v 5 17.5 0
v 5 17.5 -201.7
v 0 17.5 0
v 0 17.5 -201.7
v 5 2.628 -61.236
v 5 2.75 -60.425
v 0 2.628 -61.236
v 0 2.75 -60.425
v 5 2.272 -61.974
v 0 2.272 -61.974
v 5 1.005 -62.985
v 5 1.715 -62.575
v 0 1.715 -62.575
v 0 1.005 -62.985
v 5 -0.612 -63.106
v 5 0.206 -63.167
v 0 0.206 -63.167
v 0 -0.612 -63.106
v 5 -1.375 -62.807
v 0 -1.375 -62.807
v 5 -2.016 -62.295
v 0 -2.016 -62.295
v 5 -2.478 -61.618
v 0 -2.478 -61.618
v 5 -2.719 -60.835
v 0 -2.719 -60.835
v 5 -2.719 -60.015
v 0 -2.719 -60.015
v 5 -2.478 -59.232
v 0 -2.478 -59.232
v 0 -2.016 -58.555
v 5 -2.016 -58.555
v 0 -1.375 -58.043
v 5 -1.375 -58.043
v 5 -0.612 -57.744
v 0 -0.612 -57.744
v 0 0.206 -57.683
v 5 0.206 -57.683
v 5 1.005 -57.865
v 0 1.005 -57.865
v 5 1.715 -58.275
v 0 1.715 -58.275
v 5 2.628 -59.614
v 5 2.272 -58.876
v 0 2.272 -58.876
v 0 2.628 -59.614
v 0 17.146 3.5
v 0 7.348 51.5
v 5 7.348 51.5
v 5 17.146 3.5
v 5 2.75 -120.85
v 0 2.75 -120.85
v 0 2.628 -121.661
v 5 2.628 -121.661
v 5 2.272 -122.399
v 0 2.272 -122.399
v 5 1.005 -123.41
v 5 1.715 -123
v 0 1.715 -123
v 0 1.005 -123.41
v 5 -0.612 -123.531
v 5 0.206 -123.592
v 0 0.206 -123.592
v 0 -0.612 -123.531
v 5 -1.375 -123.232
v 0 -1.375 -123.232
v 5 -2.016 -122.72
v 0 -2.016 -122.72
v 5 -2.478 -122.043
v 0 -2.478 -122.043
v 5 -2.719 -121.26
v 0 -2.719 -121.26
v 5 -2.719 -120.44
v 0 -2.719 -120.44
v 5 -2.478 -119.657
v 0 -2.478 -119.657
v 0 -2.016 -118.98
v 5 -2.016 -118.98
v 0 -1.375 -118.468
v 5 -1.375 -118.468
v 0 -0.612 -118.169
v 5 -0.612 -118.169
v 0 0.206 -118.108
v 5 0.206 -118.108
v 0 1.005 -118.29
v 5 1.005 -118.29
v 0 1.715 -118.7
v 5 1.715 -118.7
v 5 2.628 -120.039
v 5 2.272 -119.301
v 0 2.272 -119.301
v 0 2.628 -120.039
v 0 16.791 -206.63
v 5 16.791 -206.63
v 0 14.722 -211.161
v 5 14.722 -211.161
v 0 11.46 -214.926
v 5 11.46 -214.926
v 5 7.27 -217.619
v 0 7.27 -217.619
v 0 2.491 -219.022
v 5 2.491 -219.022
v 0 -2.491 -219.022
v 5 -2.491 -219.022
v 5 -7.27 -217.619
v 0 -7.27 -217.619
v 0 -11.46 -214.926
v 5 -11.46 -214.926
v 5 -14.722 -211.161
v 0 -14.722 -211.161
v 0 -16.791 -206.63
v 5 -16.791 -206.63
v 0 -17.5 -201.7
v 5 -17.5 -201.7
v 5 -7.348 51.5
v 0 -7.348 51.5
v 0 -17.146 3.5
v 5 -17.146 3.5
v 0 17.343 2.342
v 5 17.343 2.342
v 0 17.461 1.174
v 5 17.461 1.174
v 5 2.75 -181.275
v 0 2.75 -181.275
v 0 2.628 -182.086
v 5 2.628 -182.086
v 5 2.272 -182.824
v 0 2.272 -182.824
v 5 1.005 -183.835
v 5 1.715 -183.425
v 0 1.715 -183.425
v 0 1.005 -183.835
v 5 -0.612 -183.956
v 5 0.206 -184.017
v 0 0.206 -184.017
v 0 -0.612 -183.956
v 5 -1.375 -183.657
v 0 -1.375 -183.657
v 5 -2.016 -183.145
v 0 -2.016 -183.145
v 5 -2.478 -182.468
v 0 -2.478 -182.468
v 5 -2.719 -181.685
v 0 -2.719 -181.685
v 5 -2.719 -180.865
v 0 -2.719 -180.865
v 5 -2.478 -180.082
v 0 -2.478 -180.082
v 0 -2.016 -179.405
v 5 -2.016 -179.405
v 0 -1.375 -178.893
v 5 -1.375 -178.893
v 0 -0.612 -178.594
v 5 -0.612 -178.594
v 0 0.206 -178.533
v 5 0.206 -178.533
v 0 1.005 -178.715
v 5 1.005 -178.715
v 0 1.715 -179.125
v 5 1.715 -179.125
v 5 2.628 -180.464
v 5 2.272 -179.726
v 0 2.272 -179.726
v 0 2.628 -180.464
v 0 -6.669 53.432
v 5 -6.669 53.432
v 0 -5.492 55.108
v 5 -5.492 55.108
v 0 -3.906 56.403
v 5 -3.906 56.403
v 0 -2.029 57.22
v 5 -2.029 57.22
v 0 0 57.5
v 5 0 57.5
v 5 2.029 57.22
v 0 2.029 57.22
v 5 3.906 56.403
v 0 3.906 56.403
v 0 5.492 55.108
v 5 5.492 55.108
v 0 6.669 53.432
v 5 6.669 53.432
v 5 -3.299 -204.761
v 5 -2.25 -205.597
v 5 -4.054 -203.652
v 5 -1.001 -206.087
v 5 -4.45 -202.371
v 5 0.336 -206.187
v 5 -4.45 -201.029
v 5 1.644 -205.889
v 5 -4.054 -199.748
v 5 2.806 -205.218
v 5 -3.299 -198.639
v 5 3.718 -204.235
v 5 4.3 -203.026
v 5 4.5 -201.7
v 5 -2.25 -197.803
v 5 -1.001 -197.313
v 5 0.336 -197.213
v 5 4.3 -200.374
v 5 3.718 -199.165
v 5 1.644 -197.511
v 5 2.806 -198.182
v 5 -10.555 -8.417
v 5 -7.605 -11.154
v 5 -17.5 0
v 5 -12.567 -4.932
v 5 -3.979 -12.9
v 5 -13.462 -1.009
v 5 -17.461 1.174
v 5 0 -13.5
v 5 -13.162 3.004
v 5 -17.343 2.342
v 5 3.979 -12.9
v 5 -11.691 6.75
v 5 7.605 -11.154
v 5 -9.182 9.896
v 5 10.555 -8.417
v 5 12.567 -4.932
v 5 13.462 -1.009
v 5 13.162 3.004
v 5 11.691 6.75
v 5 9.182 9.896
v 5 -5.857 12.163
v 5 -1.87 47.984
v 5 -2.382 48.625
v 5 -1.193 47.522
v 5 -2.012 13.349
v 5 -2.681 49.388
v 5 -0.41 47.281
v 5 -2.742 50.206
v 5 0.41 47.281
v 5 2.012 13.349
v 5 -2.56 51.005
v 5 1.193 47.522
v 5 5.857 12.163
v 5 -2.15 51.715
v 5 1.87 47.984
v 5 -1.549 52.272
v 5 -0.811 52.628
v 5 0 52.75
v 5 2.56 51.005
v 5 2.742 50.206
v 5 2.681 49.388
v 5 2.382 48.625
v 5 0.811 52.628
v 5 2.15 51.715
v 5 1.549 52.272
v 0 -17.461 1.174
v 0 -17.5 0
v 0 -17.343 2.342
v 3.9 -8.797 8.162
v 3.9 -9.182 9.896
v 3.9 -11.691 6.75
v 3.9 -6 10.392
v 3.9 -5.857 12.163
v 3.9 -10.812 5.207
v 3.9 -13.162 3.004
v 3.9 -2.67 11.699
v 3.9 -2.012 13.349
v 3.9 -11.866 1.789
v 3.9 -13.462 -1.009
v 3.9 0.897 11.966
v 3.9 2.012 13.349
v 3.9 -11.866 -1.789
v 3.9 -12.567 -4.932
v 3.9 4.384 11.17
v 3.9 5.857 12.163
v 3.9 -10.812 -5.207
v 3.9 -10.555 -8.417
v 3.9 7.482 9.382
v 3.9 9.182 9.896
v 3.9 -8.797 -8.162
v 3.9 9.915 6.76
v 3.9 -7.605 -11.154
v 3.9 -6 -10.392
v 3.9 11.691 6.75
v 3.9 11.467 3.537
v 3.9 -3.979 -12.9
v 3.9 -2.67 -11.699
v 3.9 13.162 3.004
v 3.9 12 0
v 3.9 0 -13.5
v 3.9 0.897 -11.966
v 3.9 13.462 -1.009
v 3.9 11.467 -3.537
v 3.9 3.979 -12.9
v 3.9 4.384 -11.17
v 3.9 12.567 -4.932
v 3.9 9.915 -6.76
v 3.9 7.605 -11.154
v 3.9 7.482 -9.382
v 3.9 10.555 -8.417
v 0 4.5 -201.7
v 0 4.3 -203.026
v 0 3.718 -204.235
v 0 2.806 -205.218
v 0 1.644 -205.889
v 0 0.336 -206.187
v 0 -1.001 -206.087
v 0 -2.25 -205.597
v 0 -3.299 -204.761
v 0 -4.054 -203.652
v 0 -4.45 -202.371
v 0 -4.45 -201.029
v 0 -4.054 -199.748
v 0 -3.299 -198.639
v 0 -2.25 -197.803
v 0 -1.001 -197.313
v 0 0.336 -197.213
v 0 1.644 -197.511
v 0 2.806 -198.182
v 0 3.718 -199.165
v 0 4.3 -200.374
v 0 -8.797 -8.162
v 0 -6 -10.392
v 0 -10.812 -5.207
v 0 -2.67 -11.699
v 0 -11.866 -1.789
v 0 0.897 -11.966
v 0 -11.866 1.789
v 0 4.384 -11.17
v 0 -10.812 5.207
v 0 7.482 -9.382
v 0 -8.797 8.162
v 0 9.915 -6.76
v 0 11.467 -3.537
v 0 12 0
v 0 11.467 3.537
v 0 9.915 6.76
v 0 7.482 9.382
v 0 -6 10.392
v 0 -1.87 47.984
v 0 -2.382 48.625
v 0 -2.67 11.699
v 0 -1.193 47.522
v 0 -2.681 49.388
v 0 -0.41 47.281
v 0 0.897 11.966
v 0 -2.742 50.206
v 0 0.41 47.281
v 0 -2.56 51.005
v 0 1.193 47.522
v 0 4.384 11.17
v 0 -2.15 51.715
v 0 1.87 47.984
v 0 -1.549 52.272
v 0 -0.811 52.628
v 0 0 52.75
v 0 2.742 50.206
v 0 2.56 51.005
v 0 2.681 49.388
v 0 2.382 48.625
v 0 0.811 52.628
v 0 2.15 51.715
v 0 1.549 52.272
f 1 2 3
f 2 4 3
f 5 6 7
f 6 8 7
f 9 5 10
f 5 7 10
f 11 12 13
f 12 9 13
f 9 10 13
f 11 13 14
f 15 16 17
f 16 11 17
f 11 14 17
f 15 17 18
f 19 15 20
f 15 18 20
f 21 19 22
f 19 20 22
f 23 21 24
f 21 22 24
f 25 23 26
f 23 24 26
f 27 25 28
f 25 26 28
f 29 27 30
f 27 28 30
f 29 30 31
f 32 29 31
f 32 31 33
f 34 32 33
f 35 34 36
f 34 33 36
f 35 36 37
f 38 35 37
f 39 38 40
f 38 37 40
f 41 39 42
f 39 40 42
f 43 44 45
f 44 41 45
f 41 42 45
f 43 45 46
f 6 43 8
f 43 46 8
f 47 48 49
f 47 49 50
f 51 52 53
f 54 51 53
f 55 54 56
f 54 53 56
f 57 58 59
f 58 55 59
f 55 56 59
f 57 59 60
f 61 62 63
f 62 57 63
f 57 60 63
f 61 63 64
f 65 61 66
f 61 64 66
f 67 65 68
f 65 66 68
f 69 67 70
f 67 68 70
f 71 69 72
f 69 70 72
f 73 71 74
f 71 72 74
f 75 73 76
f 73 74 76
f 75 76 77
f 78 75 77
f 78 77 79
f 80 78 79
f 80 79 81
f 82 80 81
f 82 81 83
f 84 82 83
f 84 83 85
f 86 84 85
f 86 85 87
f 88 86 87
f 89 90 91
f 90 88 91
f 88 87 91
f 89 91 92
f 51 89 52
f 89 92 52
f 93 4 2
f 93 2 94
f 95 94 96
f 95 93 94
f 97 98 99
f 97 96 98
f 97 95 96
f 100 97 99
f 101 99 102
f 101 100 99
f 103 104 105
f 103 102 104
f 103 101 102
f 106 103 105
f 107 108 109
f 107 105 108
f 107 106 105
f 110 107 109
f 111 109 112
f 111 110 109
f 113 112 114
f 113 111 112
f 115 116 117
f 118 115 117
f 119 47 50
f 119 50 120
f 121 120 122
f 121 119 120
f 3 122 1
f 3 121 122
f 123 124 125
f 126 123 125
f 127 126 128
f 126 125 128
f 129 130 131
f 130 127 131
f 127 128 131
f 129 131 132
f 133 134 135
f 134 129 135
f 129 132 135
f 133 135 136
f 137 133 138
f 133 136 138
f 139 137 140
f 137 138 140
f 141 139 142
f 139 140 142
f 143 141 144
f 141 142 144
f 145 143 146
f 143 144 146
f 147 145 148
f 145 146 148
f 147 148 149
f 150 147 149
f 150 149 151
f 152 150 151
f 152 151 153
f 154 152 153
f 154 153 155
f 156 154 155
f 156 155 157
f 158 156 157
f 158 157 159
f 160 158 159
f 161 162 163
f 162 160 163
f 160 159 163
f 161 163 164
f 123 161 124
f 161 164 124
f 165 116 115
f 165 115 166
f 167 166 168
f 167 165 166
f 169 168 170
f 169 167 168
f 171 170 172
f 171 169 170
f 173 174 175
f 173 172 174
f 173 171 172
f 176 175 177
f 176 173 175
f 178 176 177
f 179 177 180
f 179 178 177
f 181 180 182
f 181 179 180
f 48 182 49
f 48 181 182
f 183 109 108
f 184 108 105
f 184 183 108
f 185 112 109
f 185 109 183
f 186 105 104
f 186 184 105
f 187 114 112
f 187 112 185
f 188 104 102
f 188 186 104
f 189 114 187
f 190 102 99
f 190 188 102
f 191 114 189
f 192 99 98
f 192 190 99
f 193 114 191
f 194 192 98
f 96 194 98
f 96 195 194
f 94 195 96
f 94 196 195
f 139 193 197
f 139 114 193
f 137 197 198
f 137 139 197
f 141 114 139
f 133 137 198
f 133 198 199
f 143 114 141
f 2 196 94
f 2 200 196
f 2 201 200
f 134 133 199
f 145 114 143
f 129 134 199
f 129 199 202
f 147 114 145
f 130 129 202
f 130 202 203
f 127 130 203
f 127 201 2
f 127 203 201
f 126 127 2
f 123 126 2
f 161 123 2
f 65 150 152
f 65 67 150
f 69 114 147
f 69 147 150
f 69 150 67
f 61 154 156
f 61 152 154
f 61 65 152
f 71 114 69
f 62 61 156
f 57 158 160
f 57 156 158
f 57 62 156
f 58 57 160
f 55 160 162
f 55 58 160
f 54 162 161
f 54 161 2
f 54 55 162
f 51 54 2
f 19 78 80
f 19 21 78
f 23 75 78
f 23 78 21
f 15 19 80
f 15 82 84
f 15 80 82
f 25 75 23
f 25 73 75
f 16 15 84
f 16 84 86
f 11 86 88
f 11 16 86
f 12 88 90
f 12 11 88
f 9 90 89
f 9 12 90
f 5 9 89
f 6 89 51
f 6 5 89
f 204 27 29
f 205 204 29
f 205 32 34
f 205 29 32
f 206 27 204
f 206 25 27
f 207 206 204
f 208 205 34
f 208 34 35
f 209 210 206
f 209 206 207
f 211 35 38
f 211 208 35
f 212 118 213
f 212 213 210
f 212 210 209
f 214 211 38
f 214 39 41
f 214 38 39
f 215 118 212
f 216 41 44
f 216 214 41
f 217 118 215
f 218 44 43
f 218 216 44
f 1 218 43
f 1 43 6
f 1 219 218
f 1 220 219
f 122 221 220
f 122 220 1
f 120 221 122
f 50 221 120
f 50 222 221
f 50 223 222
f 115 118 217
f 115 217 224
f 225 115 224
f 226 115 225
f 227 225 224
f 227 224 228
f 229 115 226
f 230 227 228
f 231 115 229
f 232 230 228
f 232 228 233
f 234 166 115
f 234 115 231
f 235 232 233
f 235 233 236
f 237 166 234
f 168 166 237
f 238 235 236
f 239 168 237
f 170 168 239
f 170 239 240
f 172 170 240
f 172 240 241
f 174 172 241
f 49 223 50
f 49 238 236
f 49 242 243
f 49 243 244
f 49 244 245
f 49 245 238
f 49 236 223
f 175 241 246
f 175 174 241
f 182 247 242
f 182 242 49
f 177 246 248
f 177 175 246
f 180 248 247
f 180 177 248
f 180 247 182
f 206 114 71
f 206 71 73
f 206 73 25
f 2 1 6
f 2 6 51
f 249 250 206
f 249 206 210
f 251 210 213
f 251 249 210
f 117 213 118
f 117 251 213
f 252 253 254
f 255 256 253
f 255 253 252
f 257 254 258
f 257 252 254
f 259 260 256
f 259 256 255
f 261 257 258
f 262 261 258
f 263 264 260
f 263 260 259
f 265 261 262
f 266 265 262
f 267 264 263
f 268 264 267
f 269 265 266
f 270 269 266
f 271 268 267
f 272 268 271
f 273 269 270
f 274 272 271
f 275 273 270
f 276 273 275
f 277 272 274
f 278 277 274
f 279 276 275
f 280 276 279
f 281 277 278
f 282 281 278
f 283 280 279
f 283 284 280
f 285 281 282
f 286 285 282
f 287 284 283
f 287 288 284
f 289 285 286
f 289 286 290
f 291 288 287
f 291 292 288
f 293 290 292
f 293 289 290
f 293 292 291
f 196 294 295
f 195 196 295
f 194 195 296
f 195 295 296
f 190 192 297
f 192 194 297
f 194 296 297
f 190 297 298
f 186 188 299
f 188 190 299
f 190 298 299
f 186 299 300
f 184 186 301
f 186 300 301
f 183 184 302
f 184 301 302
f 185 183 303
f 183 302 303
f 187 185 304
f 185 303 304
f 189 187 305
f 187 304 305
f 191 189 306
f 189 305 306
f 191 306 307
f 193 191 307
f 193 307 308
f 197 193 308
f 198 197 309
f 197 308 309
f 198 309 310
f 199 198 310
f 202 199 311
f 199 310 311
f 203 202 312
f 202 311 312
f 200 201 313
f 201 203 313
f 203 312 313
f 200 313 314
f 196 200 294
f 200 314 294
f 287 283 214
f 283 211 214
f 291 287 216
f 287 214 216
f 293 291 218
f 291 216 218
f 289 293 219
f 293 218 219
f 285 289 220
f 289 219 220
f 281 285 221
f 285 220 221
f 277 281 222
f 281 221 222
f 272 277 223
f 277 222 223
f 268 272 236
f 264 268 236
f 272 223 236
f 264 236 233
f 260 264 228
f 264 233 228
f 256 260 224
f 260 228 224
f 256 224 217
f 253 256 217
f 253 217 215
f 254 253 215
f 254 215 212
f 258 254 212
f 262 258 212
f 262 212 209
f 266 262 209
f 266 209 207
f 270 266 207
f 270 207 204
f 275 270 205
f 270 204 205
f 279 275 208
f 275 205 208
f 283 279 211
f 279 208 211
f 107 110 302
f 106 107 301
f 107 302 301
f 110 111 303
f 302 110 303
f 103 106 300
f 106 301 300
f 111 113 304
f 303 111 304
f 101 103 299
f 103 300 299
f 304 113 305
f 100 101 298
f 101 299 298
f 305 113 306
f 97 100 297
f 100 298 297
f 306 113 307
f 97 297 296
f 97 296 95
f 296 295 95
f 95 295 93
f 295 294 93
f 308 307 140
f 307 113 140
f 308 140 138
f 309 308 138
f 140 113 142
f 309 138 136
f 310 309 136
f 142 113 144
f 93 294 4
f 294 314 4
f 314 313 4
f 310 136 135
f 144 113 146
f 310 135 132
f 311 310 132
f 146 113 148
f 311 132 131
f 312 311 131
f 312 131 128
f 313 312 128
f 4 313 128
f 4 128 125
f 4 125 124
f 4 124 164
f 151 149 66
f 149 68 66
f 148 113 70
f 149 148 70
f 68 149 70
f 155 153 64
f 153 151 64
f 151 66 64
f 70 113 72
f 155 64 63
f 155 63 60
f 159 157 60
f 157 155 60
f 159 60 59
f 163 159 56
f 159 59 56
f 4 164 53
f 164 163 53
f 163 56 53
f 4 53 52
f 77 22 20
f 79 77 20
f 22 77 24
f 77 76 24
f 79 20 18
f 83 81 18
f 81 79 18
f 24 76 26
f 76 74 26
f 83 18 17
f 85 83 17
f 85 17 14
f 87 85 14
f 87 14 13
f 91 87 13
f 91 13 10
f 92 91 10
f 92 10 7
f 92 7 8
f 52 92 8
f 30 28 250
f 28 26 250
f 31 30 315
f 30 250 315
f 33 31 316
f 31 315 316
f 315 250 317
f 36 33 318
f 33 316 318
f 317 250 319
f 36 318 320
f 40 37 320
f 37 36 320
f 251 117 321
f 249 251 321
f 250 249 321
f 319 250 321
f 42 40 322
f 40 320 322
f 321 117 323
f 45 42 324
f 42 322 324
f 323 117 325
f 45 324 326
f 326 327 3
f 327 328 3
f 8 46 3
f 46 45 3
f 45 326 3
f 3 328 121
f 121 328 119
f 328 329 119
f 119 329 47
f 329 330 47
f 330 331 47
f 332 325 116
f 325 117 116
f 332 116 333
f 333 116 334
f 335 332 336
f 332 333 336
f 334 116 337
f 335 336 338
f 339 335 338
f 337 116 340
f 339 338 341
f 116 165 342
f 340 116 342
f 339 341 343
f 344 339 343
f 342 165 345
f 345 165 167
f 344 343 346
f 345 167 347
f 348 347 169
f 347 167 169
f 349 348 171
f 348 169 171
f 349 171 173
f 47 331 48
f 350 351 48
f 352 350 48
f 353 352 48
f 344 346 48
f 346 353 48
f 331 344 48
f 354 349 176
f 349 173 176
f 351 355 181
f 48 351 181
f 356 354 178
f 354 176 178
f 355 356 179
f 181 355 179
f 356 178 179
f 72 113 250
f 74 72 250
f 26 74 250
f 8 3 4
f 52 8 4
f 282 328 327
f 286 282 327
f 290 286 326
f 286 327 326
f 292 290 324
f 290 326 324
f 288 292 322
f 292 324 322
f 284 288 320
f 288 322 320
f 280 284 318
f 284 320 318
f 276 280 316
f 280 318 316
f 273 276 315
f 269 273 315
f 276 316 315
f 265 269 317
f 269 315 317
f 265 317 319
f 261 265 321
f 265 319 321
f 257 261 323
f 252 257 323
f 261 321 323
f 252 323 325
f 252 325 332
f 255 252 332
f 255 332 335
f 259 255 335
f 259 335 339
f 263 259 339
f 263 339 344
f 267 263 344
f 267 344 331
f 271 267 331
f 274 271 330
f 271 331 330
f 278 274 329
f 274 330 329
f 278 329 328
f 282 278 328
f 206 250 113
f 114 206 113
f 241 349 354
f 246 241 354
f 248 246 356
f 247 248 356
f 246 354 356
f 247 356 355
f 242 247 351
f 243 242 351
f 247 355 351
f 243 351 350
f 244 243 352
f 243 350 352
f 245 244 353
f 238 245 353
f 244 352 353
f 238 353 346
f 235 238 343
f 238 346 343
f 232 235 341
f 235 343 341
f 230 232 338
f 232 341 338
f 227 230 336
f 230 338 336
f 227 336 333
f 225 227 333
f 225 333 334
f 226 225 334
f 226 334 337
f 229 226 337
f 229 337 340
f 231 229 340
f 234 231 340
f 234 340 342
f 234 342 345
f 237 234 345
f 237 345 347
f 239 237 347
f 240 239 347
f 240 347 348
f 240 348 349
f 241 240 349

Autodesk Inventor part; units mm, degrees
ref_plane "YZ Plane" through (0, 0, 0) normal (1, 0, 0) x (0, 1, 0)
ref_plane "XZ Plane" through (0, 0, 0) normal (0, 1, 0) x (-1, 0, 0)
ref_plane "XY Plane" through (0, 0, 0) normal (0, 0, 1) x (1, 0, 0)
sketch "Sketch1" plane through (0, 0, 0) normal (1, 0, 0) x (0, 1, 0)
  circle A0 centre (0, 0) radius 12
  circle A1 centre (0, 0) radius 17.5
  line L0 (0, 0) -> (0, -201.7) construction
  line L1 (-17.5, 0) -> (-17.5, -201.7)
  line L2 (17.5, -201.7) -> (17.5, 0)
  arc A2 (17.5, 0) -> (-17.5, 0) centre (0, 0) ccw
  arc A3 (-17.5, -201.7) -> (17.5, -201.7) centre (0, -201.7) ccw
  line L3 (0, 0) -> (201.7, 0) construction
  circle A4 centre (0, -60.425) radius 2.75
  circle A5 centre (0, -120.85) radius 2.75
  circle A6 centre (0, -181.275) radius 2.75
  circle A7 centre (0, -201.7) radius 4.5
  circle A8 centre (0, 50) radius 2.75
  arc A9 (7.3485, 51.5) -> (-7.3485, 51.5) centre (0, 50) ccw
  line L4 (7.3485, 51.5) -> (17.1464, 3.5)
  line L5 (-7.3485, 51.5) -> (-17.1464, 3.5)
  arc A10 (17.1464, 3.5) -> (-17.1464, 3.5) centre (0, 0) ccw
  point P0 (0, -100.85)
  dimension "d0" = 24
  dimension "d1" = 35
  dimension "d7" = 201.7
  dimension "d8" = 90
  dimension "d9" = 35
  dimension "d13" = 5.5
  dimension "d14" = 60.425
  dimension "d15" = 17.5
  dimension "d18" = 60.425
  dimension "d23" = 9
  dimension "d24" = 5.5
  dimension "d25" = 17.5
  dimension "d26" = 50
  dimension "d27" = 15
extrude "Extrusion1" add sketch "Sketch1" along normal blind 5 contours A1 | L2 A3 L1 A1 | A1 L5 A9 L4 | A8
sketch "Sketch2" plane through (5, 0, 0) normal (1, 0, 0) x (0, 0, -1)
  circle A0 centre (0, 0) radius 13.5
  dimension "d4" = 27
extrude "Extrusion2" cut sketch "Sketch2" against normal blind 1.1
sketch "Sketch4" plane through (0, 0, 0) normal (-1, 0, 0) x (0, 0, 1)
  circle A0 centre (50, 0) radius 2.75
  arc A1 (51.5, -7.3485) -> (51.5, 7.3485) centre (50, 0) ccw projected
  point P0 (0, 0)
  dimension "d28" = 5.5
extrude "Extrusion4" cut sketch "Sketch4" against normal blind 10
properties part number "Bearing Holder" material "Aluminum 6061"
